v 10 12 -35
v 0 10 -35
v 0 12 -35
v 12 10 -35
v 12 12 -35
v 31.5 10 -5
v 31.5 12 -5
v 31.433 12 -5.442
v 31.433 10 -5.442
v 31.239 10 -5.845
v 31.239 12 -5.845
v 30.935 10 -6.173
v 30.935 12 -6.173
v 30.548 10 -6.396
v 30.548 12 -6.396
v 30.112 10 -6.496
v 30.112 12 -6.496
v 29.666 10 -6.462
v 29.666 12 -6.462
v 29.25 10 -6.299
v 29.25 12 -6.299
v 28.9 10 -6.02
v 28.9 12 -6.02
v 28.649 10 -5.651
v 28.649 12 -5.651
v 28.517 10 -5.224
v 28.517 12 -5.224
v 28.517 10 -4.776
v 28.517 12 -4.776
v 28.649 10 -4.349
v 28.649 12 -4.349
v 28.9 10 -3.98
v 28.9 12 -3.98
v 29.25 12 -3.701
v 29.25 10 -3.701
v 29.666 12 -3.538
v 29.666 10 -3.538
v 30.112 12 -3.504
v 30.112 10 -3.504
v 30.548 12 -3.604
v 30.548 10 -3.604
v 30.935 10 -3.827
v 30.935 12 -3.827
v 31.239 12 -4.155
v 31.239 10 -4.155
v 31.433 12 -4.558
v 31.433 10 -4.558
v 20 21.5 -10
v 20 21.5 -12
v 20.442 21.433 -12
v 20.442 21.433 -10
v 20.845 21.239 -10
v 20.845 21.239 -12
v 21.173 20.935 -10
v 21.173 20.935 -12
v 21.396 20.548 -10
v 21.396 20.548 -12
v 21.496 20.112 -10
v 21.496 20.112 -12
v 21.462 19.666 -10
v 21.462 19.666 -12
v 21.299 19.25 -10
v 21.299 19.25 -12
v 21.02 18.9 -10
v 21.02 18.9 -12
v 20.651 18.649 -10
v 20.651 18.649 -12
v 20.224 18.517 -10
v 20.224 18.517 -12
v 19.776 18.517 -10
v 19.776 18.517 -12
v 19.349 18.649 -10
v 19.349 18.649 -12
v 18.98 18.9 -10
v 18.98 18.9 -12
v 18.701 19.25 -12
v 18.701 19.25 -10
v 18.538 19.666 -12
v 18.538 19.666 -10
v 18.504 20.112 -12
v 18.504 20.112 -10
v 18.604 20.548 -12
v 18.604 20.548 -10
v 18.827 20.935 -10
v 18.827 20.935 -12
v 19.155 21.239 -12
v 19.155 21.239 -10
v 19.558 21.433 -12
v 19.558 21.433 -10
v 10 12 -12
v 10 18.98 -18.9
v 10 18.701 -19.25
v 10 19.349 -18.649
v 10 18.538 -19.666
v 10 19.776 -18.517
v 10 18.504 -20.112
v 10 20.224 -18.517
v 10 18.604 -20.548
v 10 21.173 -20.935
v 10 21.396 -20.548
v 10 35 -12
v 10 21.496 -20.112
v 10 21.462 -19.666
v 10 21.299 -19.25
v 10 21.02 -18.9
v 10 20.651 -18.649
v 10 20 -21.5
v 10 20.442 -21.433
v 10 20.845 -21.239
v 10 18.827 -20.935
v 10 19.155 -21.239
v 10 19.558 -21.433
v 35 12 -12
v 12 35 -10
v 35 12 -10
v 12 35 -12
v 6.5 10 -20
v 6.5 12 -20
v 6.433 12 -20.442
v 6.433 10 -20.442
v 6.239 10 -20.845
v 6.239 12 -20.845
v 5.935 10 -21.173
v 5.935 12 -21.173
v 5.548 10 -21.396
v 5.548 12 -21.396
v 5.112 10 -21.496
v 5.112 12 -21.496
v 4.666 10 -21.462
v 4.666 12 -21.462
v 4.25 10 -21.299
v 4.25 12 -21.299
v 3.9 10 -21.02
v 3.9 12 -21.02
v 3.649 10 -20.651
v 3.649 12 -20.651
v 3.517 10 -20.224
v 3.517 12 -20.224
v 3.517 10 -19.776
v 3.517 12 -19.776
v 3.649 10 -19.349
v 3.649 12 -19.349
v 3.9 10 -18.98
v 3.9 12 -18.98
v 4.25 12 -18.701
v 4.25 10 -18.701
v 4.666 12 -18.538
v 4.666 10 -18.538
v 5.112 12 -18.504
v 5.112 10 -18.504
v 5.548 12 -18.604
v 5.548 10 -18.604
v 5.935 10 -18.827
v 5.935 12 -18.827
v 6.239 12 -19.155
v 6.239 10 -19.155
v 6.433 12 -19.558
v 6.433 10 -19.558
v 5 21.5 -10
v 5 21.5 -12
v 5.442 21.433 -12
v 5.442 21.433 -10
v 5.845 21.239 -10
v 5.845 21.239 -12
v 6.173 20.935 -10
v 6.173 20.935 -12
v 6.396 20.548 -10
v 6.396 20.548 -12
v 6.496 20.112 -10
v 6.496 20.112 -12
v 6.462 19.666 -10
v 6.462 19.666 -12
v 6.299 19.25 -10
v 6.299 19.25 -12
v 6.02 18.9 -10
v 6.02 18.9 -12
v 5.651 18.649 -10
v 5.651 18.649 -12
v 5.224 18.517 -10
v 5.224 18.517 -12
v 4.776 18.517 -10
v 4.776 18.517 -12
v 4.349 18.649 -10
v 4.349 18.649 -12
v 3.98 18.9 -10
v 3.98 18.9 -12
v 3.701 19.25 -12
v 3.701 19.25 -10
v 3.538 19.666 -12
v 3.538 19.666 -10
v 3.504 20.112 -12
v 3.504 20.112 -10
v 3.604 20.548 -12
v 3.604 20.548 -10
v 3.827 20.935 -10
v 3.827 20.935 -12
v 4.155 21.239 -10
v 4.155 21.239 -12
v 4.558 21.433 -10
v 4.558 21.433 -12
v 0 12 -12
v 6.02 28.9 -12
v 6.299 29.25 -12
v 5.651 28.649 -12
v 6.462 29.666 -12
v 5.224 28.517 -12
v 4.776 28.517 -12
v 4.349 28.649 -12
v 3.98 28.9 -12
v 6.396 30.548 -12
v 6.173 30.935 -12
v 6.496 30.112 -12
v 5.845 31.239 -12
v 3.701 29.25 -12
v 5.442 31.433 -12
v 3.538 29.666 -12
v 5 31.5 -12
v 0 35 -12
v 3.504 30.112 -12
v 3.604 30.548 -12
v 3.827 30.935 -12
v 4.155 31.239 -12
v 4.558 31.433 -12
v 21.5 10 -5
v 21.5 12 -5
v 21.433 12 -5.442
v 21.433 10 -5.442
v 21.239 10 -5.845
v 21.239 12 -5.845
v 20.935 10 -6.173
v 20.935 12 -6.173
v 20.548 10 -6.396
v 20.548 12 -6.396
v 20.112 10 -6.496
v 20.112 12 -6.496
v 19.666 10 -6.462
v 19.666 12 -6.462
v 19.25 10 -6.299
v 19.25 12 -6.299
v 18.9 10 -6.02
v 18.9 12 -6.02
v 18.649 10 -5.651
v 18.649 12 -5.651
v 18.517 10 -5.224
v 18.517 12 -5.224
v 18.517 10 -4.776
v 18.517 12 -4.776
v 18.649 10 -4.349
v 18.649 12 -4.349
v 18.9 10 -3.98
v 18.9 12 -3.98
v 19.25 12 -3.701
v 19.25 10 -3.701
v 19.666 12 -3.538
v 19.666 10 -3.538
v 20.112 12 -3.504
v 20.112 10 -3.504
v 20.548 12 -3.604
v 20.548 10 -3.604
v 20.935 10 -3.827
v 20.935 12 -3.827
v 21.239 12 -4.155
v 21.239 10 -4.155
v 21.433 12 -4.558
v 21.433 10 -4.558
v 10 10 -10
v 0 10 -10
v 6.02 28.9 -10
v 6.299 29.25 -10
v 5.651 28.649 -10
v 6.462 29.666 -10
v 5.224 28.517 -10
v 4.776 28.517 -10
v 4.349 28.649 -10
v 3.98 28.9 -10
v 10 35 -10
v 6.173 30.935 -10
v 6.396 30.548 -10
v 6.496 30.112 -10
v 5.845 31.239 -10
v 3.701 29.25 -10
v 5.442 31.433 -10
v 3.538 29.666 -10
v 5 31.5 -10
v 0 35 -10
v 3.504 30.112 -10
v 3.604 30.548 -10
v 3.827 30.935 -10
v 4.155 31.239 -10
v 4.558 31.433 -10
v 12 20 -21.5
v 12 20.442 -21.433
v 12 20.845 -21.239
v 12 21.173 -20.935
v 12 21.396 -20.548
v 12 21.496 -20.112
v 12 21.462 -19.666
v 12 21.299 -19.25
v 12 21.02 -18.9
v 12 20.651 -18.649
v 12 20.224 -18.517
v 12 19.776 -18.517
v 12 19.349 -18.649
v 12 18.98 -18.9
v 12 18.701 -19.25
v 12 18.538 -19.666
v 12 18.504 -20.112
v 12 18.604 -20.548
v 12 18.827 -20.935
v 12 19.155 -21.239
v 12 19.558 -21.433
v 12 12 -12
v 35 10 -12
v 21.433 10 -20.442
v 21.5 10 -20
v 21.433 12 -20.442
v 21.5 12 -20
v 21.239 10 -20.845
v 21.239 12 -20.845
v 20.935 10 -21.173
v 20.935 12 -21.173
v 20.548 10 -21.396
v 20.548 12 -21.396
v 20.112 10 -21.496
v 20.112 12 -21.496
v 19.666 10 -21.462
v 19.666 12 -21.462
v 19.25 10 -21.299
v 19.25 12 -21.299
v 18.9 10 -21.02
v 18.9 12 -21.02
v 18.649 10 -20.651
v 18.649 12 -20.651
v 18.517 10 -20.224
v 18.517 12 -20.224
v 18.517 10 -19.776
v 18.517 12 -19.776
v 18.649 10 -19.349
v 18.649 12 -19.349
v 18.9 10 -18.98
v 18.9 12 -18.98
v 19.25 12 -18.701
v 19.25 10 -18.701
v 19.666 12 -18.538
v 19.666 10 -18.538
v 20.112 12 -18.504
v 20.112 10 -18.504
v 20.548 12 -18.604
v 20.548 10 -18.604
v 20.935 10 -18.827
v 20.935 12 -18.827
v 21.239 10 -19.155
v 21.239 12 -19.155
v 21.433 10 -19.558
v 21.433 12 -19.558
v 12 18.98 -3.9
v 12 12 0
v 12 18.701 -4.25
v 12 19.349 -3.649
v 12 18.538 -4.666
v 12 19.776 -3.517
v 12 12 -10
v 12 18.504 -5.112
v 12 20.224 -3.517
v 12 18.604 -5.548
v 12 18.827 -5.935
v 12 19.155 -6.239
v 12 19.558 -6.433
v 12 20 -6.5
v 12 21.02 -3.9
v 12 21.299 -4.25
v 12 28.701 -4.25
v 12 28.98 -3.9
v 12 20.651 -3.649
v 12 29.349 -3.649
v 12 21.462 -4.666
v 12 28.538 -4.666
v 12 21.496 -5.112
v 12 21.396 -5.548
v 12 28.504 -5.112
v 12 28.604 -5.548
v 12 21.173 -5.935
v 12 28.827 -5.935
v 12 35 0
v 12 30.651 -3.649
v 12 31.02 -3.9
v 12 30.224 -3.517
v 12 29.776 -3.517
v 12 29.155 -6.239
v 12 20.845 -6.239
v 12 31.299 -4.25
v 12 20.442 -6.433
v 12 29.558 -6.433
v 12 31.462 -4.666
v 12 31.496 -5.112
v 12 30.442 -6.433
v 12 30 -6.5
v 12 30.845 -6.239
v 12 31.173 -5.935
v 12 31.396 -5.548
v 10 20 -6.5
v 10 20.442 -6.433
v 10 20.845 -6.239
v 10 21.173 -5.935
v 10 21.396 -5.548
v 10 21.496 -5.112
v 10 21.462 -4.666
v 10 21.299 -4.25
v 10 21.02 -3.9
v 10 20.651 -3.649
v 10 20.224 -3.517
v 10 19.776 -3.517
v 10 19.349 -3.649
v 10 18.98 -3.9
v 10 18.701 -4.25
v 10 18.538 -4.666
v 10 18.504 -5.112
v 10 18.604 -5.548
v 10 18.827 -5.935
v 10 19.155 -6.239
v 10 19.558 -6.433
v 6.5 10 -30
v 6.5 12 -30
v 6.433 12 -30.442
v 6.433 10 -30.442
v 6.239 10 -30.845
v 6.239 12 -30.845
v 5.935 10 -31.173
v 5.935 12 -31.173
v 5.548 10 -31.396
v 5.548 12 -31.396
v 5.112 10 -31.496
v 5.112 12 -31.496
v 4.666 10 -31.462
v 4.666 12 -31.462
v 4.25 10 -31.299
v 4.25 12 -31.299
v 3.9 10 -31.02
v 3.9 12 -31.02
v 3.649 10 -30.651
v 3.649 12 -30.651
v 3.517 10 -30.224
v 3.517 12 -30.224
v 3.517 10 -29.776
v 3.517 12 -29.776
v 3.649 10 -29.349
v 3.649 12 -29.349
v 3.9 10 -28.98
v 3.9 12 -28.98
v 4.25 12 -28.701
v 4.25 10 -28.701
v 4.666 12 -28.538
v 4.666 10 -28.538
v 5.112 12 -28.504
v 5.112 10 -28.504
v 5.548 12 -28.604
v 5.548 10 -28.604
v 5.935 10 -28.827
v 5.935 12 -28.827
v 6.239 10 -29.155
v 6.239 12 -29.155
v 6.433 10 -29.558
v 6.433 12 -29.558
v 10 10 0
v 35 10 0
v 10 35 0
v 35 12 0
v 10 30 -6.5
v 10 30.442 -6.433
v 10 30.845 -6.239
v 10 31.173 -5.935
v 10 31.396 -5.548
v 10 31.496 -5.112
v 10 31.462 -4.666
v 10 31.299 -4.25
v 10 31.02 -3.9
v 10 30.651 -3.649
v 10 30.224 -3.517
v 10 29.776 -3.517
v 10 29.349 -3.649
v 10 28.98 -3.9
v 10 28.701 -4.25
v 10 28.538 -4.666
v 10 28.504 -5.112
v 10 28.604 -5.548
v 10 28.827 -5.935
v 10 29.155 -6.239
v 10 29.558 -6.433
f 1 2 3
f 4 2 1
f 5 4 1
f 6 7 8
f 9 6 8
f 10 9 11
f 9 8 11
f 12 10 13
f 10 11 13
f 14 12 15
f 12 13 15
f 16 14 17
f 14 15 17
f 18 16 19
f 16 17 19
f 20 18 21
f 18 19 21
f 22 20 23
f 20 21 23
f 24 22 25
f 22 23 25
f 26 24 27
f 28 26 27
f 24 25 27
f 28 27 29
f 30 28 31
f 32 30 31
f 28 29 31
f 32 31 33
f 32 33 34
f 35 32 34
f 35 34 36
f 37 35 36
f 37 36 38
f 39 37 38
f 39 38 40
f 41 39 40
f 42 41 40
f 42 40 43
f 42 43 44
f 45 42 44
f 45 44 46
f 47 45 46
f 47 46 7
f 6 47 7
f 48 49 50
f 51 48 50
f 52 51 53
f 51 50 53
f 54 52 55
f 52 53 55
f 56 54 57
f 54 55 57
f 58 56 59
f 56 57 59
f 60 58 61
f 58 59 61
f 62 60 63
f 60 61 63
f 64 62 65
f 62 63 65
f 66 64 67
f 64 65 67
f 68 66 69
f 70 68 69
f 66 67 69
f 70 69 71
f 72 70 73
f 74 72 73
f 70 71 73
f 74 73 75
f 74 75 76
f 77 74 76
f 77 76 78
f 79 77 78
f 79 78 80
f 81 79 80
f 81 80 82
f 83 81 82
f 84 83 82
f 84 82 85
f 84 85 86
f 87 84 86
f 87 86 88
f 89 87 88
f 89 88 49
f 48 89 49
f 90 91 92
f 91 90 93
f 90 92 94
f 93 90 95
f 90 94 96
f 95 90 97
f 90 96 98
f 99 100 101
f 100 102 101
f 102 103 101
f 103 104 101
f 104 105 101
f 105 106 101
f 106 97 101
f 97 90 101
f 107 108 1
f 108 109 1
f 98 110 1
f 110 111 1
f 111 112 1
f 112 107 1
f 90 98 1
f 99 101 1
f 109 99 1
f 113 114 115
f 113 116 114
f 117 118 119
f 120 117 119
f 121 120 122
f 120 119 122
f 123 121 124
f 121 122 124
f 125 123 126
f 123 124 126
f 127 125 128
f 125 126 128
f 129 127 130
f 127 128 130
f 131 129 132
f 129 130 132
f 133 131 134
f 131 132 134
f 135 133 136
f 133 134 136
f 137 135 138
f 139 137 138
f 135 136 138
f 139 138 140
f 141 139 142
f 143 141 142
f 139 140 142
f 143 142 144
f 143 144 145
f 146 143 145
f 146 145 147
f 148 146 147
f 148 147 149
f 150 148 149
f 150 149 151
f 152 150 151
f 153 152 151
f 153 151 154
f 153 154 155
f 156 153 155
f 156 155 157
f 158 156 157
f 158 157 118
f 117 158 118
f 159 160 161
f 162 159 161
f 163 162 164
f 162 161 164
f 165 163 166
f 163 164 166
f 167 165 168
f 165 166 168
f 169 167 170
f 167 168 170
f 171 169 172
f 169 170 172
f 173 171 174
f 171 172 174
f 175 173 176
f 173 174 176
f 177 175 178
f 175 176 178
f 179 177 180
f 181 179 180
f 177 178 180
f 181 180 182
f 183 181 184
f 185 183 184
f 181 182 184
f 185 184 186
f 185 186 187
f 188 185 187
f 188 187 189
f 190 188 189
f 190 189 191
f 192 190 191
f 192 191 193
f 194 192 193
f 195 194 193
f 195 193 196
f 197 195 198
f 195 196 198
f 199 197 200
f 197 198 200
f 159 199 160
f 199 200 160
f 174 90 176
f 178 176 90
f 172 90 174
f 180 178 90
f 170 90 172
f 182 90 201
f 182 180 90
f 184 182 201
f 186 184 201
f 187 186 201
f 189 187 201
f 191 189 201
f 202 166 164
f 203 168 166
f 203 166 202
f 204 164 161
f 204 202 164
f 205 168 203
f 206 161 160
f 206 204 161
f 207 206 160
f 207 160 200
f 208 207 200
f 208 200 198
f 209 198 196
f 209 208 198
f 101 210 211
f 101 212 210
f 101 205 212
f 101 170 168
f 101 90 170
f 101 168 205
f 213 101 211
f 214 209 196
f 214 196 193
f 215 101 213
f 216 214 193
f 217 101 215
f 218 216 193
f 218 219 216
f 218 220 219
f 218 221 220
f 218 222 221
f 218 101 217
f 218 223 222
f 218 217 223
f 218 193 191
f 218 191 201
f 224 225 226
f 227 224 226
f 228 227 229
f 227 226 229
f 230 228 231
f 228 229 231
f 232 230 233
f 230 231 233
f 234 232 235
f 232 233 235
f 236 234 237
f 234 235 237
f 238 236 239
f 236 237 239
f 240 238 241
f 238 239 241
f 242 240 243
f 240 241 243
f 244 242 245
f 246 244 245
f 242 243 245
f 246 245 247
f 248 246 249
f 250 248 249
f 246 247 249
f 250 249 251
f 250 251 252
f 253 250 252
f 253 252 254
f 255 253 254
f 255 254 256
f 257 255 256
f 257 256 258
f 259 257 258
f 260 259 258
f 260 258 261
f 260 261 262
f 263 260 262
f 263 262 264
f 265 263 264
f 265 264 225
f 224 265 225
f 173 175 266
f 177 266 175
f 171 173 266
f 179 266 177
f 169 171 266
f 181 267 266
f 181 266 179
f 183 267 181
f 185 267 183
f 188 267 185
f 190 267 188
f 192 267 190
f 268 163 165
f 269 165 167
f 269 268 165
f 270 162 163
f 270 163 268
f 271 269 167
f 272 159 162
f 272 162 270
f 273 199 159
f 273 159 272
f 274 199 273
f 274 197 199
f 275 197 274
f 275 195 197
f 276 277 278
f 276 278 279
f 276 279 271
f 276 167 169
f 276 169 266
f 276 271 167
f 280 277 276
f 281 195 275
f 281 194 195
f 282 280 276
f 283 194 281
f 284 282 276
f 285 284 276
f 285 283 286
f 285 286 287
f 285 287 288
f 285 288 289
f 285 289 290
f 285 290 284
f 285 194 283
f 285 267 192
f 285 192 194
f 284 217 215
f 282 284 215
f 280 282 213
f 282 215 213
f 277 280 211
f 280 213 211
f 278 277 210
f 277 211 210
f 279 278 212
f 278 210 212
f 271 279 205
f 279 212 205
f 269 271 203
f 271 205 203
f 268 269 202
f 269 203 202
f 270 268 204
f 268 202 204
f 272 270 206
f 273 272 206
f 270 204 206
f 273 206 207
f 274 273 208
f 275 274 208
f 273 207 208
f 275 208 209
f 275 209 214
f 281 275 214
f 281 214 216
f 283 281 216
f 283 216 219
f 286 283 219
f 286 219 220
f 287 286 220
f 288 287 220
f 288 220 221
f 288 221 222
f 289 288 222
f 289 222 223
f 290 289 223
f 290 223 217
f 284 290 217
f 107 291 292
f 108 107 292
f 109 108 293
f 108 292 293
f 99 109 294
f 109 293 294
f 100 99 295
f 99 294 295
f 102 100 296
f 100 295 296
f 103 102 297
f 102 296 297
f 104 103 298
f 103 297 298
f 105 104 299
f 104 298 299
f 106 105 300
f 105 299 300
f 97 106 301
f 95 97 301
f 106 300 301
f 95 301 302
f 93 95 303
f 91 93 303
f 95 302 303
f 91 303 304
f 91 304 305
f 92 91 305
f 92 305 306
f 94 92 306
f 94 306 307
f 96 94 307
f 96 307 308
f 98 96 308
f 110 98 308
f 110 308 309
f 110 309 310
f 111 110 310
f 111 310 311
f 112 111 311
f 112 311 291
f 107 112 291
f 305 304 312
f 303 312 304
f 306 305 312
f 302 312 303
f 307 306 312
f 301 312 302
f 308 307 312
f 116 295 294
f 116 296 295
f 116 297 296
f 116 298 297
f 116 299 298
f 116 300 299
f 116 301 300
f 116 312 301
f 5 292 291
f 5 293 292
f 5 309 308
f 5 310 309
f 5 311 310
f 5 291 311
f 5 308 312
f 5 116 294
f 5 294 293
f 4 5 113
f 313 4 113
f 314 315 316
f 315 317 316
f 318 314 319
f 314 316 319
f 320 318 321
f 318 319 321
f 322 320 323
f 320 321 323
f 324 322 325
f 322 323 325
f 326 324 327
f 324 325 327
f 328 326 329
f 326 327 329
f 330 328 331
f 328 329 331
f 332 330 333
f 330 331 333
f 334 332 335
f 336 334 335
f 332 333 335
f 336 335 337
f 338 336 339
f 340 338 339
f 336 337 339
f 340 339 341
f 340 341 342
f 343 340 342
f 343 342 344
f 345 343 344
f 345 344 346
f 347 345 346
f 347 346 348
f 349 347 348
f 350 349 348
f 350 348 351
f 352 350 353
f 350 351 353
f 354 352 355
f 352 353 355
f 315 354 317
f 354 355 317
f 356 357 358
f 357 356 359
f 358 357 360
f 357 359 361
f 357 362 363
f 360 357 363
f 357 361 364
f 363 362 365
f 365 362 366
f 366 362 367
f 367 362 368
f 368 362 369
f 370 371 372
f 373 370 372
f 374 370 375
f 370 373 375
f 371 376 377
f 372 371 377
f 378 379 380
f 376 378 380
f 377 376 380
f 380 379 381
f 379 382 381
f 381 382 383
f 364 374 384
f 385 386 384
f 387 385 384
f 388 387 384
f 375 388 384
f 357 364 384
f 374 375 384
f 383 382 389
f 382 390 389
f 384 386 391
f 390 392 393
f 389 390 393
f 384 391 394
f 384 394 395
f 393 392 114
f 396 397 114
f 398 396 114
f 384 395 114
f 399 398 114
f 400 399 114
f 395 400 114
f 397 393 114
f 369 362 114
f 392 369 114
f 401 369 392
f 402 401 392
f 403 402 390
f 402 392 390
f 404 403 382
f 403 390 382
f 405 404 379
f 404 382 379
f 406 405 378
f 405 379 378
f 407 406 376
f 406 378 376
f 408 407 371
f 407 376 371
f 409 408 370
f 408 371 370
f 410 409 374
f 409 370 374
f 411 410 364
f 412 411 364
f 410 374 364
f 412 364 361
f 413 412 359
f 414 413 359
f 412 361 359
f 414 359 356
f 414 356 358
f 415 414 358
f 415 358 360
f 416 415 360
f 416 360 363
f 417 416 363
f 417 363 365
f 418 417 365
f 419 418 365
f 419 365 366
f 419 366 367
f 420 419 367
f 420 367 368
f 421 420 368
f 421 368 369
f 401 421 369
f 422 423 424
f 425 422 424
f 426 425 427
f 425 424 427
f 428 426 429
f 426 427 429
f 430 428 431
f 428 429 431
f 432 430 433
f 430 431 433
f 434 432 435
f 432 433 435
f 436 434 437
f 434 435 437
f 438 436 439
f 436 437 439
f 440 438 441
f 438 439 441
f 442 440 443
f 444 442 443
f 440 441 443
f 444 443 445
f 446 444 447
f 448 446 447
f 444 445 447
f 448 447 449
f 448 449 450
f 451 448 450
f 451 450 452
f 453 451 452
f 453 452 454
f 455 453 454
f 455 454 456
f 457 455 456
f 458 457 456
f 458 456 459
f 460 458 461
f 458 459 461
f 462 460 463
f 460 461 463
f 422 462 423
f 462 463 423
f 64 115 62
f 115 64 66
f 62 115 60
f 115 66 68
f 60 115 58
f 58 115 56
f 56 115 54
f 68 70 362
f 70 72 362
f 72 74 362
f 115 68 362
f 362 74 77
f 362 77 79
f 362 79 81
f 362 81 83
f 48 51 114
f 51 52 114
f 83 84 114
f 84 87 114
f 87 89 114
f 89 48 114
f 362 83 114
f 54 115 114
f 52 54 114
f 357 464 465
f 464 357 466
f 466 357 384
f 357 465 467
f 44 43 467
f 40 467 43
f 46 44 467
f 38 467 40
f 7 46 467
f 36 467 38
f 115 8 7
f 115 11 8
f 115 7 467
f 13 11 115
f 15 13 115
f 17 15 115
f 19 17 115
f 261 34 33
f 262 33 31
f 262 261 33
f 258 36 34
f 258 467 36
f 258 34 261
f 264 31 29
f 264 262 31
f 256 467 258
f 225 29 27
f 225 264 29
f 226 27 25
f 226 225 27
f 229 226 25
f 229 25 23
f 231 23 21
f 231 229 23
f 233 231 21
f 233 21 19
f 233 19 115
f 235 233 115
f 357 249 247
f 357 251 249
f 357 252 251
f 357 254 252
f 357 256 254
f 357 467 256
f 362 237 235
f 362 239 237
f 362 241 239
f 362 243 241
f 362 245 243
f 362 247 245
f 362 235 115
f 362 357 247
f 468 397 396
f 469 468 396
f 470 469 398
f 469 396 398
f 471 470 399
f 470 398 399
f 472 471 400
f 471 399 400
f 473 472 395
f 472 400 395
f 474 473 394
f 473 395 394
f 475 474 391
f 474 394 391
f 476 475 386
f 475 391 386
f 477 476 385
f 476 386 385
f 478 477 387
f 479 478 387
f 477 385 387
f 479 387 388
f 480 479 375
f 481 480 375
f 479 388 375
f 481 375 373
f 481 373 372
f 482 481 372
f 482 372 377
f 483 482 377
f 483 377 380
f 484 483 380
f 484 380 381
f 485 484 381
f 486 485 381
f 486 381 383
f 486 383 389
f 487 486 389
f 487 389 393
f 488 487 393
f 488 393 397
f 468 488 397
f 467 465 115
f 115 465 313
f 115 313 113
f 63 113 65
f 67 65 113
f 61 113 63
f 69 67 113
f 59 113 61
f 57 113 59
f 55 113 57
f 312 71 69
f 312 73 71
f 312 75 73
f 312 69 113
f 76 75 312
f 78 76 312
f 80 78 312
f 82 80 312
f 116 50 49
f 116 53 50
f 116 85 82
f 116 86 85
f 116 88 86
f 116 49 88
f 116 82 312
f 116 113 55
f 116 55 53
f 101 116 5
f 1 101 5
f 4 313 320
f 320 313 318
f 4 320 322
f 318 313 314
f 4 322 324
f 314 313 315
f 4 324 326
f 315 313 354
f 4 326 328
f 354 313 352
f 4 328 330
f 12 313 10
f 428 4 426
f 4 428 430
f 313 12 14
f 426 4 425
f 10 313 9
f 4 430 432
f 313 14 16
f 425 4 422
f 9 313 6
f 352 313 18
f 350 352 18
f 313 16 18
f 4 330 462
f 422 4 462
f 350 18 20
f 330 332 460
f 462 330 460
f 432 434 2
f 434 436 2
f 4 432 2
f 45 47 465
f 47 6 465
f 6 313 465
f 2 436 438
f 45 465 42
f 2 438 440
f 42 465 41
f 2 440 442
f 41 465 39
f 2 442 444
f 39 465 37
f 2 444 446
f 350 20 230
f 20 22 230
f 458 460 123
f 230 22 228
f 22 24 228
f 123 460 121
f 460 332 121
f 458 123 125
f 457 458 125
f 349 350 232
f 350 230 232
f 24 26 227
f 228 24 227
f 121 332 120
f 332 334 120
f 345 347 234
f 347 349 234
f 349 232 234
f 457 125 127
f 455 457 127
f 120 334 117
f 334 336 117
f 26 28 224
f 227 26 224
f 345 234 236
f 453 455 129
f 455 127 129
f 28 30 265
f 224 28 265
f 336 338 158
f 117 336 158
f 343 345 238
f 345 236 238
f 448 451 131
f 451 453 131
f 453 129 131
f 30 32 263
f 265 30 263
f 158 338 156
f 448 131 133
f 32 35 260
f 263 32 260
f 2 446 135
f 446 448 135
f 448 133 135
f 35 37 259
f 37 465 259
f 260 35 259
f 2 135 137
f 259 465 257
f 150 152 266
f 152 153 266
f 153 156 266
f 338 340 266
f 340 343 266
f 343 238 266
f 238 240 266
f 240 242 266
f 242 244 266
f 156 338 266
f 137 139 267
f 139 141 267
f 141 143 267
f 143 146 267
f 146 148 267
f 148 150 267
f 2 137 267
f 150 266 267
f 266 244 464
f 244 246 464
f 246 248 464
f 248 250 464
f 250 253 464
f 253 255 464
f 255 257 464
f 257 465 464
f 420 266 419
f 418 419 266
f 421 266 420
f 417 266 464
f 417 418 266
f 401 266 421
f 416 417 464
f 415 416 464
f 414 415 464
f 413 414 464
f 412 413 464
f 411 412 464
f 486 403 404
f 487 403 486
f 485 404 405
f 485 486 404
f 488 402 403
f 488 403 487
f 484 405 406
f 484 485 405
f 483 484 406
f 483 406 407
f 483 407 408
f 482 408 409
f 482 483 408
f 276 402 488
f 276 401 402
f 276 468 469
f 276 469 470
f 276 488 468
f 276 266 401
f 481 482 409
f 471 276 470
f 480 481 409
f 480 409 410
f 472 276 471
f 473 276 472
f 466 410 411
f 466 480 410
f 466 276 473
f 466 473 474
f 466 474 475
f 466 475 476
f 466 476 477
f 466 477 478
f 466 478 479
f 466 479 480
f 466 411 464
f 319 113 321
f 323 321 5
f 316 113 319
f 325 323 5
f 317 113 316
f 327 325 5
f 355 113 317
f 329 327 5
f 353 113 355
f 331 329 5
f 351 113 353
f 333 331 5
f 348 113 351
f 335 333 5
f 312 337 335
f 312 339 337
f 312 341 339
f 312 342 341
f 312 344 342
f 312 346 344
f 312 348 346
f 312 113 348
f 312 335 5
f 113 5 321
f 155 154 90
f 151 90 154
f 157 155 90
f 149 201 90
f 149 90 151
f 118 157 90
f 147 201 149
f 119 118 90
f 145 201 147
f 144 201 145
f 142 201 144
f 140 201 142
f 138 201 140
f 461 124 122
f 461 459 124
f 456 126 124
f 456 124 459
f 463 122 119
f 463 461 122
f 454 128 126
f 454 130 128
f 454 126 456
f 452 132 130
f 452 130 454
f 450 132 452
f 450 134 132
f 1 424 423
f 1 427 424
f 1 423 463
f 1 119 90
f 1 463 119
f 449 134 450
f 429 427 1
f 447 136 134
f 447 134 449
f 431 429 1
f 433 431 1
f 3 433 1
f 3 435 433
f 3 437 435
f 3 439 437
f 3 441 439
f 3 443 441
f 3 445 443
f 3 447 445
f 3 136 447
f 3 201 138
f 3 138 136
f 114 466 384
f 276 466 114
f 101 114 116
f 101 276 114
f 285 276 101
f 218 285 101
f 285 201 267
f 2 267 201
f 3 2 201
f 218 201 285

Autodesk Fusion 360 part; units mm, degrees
box "BoxPrimitive1" add length 35 width 12 height 12 placed x (0, 0, -1) y (-1, 0, 0) z (0, 1, 0) at (12, 0, 0)
box "BoxPrimitive2" add length 12 width 35 height 12 placed x (0, 0, -1) y (-1, 0, 0) z (0, 1, 0) at (35, 0, 0)
box "BoxPrimitive3" add length 12 width 12 height 35 placed x (0, 0, -1) y (-1, 0, 0) z (0, 1, 0) at (12, 0, 0)
cylinder "CylinderPrimitive1" cut diameter 3 height 15 placed x (1, 0, 0) y (0, 0, -1) z (0, 1, 0) at (30, 0, -5)
cylinder "CylinderPrimitive2" cut diameter 3 height 15 placed x (1, 0, 0) y (0, 0, -1) z (0, 1, 0) at (20, 0, -5)
cylinder "CylinderPrimitive3" cut diameter 3 height 15 placed x (1, 0, 0) y (0, 0, -1) z (0, 1, 0) at (5, 0, -30)
cylinder "CylinderPrimitive4" cut diameter 3 height 15 placed x (1, 0, 0) y (0, 0, -1) z (0, 1, 0) at (5, 0, -20)
cylinder "CylinderPrimitive5" cut diameter 3 height 15 placed x (0, 0, -1) y (0, 1, 0) z (1, 0, 0) at (0, 5, -30)
cylinder "CylinderPrimitive6" cut diameter 3 height 15 placed x (0, 0, -1) y (0, 1, 0) z (1, 0, 0) at (0, 5, -20)
cylinder "CylinderPrimitive7" cut diameter 3 height -15 placed x (0, 1, 0) y (1, 0, 0) z (0, 0, -1) at (30, 5, -12)
cylinder "CylinderPrimitive8" cut diameter 3 height -15 placed x (0, 1, 0) y (1, 0, 0) z (0, 0, -1) at (20, 5, -12)
cylinder "CylinderPrimitive9" cut diameter 3 height -15 placed x (0, 0, -1) y (0, 1, 0) z (1, 0, 0) at (12, 30, -5)
cylinder "CylinderPrimitive10" cut diameter 3 height -15 placed x (0, 0, -1) y (0, 1, 0) z (1, 0, 0) at (12, 20, -5)
cylinder "CylinderPrimitive11" cut diameter 3 height -15 placed x (0, 1, 0) y (1, 0, 0) z (0, 0, -1) at (5, 30, -12)
cylinder "CylinderPrimitive12" cut diameter 3 height -15 placed x (0, 1, 0) y (1, 0, 0) z (0, 0, -1) at (5, 20, -12)
box "BoxPrimitive7" cut length 45 width 50 height 10 placed x (0, 0, -1) y (-1, 0, 0) z (0, 1, 0) at (40, 0, 0)
box "BoxPrimitive9" cut length 52 width 10 height -10 placed x (0, 1, 0) y (-1, 0, 0) z (0, 0, 1) at (10, -12, 0)
sketch "Sketch32" plane through (0, 0, -12) normal (0, 0, -1) x (-1, 0, 0)
  circle A0 centre (-5, 20) radius 1.5
  circle A1 centre (-5, 30) radius 1.5
  line L0 (-12, 12) -> (0, 12)
  line L1 (0, 12) -> (0, 35)
  line L2 (0, 35) -> (-12, 35)
  line L3 (-12, 35) -> (-12, 12)
  line L4 (-12, 35) -> (-35, 12)
  line L5 (-35, 12) -> (-12, 12)
  point P0 (-35, 12)
extrude "Extrude8" add sketch "Sketch32" against normal blind 2 contours L3 L4 L5
sketch "Sketch33" plane through (12, 0, 0) normal (1, 0, 0) x (0, 0, -1)
  line L0 (10, 12) -> (10, 35)
  line L1 (10, 35) -> (0, 35)
  line L2 (0, 35) -> (0, 12)
  line L3 (0, 12) -> (10, 12)
  circle A0 centre (5, 30) radius 1.5
  circle A1 centre (5, 20) radius 1.5
  line L4 (12, 35) -> (35, 12)
  line L5 (35, 12) -> (12, 12)
  line L6 (12, 12) -> (12, 35)
  point P0 (12, 35)
  point P1 (35, 12)
  point P2 (12, 12)
extrude "Extrude9" add sketch "Sketch33" against normal blind 2 contours L4 L5 L6
sketch "Sketch34" plane through (0, 12, 0) normal (0, 1, 0) x (-1, 0, 0)
  line L0 (-35, -10) -> (-12, -10)
  line L1 (-12, -10) -> (-12, 0)
  line L2 (-12, 0) -> (-35, 0)
  line L3 (-35, 0) -> (-35, -10)
  circle A0 centre (-30, -5) radius 1.5
  circle A1 centre (-20, -5) radius 1.5
  line L4 (-12, -35) -> (-35, -12)
  line L5 (-35, -12) -> (-12, -12)
  line L6 (-12, -12) -> (-12, -35)
  point P0 (-12, -35)
  point P1 (-35, -12)
  point P2 (-12, -12)
  point P3 (-12, -35)
extrude "Extrude10" add sketch "Sketch34" against normal blind 2 contours L4 L5 L6
cylinder "CylinderPrimitive13" cut diameter 3 height 15 placed x (1, 0, 0) y (0, 0, -1) z (0, 1, 0) at (20, 0, -20)
cylinder "CylinderPrimitive14" cut diameter 3 height -15 placed x (0, 0, -1) y (0, 1, 0) z (1, 0, 0) at (12, 20, -20)
cylinder "CylinderPrimitive15" cut diameter 3 height -15 placed x (0, 1, 0) y (1, 0, 0) z (0, 0, -1) at (20, 20, -12)
